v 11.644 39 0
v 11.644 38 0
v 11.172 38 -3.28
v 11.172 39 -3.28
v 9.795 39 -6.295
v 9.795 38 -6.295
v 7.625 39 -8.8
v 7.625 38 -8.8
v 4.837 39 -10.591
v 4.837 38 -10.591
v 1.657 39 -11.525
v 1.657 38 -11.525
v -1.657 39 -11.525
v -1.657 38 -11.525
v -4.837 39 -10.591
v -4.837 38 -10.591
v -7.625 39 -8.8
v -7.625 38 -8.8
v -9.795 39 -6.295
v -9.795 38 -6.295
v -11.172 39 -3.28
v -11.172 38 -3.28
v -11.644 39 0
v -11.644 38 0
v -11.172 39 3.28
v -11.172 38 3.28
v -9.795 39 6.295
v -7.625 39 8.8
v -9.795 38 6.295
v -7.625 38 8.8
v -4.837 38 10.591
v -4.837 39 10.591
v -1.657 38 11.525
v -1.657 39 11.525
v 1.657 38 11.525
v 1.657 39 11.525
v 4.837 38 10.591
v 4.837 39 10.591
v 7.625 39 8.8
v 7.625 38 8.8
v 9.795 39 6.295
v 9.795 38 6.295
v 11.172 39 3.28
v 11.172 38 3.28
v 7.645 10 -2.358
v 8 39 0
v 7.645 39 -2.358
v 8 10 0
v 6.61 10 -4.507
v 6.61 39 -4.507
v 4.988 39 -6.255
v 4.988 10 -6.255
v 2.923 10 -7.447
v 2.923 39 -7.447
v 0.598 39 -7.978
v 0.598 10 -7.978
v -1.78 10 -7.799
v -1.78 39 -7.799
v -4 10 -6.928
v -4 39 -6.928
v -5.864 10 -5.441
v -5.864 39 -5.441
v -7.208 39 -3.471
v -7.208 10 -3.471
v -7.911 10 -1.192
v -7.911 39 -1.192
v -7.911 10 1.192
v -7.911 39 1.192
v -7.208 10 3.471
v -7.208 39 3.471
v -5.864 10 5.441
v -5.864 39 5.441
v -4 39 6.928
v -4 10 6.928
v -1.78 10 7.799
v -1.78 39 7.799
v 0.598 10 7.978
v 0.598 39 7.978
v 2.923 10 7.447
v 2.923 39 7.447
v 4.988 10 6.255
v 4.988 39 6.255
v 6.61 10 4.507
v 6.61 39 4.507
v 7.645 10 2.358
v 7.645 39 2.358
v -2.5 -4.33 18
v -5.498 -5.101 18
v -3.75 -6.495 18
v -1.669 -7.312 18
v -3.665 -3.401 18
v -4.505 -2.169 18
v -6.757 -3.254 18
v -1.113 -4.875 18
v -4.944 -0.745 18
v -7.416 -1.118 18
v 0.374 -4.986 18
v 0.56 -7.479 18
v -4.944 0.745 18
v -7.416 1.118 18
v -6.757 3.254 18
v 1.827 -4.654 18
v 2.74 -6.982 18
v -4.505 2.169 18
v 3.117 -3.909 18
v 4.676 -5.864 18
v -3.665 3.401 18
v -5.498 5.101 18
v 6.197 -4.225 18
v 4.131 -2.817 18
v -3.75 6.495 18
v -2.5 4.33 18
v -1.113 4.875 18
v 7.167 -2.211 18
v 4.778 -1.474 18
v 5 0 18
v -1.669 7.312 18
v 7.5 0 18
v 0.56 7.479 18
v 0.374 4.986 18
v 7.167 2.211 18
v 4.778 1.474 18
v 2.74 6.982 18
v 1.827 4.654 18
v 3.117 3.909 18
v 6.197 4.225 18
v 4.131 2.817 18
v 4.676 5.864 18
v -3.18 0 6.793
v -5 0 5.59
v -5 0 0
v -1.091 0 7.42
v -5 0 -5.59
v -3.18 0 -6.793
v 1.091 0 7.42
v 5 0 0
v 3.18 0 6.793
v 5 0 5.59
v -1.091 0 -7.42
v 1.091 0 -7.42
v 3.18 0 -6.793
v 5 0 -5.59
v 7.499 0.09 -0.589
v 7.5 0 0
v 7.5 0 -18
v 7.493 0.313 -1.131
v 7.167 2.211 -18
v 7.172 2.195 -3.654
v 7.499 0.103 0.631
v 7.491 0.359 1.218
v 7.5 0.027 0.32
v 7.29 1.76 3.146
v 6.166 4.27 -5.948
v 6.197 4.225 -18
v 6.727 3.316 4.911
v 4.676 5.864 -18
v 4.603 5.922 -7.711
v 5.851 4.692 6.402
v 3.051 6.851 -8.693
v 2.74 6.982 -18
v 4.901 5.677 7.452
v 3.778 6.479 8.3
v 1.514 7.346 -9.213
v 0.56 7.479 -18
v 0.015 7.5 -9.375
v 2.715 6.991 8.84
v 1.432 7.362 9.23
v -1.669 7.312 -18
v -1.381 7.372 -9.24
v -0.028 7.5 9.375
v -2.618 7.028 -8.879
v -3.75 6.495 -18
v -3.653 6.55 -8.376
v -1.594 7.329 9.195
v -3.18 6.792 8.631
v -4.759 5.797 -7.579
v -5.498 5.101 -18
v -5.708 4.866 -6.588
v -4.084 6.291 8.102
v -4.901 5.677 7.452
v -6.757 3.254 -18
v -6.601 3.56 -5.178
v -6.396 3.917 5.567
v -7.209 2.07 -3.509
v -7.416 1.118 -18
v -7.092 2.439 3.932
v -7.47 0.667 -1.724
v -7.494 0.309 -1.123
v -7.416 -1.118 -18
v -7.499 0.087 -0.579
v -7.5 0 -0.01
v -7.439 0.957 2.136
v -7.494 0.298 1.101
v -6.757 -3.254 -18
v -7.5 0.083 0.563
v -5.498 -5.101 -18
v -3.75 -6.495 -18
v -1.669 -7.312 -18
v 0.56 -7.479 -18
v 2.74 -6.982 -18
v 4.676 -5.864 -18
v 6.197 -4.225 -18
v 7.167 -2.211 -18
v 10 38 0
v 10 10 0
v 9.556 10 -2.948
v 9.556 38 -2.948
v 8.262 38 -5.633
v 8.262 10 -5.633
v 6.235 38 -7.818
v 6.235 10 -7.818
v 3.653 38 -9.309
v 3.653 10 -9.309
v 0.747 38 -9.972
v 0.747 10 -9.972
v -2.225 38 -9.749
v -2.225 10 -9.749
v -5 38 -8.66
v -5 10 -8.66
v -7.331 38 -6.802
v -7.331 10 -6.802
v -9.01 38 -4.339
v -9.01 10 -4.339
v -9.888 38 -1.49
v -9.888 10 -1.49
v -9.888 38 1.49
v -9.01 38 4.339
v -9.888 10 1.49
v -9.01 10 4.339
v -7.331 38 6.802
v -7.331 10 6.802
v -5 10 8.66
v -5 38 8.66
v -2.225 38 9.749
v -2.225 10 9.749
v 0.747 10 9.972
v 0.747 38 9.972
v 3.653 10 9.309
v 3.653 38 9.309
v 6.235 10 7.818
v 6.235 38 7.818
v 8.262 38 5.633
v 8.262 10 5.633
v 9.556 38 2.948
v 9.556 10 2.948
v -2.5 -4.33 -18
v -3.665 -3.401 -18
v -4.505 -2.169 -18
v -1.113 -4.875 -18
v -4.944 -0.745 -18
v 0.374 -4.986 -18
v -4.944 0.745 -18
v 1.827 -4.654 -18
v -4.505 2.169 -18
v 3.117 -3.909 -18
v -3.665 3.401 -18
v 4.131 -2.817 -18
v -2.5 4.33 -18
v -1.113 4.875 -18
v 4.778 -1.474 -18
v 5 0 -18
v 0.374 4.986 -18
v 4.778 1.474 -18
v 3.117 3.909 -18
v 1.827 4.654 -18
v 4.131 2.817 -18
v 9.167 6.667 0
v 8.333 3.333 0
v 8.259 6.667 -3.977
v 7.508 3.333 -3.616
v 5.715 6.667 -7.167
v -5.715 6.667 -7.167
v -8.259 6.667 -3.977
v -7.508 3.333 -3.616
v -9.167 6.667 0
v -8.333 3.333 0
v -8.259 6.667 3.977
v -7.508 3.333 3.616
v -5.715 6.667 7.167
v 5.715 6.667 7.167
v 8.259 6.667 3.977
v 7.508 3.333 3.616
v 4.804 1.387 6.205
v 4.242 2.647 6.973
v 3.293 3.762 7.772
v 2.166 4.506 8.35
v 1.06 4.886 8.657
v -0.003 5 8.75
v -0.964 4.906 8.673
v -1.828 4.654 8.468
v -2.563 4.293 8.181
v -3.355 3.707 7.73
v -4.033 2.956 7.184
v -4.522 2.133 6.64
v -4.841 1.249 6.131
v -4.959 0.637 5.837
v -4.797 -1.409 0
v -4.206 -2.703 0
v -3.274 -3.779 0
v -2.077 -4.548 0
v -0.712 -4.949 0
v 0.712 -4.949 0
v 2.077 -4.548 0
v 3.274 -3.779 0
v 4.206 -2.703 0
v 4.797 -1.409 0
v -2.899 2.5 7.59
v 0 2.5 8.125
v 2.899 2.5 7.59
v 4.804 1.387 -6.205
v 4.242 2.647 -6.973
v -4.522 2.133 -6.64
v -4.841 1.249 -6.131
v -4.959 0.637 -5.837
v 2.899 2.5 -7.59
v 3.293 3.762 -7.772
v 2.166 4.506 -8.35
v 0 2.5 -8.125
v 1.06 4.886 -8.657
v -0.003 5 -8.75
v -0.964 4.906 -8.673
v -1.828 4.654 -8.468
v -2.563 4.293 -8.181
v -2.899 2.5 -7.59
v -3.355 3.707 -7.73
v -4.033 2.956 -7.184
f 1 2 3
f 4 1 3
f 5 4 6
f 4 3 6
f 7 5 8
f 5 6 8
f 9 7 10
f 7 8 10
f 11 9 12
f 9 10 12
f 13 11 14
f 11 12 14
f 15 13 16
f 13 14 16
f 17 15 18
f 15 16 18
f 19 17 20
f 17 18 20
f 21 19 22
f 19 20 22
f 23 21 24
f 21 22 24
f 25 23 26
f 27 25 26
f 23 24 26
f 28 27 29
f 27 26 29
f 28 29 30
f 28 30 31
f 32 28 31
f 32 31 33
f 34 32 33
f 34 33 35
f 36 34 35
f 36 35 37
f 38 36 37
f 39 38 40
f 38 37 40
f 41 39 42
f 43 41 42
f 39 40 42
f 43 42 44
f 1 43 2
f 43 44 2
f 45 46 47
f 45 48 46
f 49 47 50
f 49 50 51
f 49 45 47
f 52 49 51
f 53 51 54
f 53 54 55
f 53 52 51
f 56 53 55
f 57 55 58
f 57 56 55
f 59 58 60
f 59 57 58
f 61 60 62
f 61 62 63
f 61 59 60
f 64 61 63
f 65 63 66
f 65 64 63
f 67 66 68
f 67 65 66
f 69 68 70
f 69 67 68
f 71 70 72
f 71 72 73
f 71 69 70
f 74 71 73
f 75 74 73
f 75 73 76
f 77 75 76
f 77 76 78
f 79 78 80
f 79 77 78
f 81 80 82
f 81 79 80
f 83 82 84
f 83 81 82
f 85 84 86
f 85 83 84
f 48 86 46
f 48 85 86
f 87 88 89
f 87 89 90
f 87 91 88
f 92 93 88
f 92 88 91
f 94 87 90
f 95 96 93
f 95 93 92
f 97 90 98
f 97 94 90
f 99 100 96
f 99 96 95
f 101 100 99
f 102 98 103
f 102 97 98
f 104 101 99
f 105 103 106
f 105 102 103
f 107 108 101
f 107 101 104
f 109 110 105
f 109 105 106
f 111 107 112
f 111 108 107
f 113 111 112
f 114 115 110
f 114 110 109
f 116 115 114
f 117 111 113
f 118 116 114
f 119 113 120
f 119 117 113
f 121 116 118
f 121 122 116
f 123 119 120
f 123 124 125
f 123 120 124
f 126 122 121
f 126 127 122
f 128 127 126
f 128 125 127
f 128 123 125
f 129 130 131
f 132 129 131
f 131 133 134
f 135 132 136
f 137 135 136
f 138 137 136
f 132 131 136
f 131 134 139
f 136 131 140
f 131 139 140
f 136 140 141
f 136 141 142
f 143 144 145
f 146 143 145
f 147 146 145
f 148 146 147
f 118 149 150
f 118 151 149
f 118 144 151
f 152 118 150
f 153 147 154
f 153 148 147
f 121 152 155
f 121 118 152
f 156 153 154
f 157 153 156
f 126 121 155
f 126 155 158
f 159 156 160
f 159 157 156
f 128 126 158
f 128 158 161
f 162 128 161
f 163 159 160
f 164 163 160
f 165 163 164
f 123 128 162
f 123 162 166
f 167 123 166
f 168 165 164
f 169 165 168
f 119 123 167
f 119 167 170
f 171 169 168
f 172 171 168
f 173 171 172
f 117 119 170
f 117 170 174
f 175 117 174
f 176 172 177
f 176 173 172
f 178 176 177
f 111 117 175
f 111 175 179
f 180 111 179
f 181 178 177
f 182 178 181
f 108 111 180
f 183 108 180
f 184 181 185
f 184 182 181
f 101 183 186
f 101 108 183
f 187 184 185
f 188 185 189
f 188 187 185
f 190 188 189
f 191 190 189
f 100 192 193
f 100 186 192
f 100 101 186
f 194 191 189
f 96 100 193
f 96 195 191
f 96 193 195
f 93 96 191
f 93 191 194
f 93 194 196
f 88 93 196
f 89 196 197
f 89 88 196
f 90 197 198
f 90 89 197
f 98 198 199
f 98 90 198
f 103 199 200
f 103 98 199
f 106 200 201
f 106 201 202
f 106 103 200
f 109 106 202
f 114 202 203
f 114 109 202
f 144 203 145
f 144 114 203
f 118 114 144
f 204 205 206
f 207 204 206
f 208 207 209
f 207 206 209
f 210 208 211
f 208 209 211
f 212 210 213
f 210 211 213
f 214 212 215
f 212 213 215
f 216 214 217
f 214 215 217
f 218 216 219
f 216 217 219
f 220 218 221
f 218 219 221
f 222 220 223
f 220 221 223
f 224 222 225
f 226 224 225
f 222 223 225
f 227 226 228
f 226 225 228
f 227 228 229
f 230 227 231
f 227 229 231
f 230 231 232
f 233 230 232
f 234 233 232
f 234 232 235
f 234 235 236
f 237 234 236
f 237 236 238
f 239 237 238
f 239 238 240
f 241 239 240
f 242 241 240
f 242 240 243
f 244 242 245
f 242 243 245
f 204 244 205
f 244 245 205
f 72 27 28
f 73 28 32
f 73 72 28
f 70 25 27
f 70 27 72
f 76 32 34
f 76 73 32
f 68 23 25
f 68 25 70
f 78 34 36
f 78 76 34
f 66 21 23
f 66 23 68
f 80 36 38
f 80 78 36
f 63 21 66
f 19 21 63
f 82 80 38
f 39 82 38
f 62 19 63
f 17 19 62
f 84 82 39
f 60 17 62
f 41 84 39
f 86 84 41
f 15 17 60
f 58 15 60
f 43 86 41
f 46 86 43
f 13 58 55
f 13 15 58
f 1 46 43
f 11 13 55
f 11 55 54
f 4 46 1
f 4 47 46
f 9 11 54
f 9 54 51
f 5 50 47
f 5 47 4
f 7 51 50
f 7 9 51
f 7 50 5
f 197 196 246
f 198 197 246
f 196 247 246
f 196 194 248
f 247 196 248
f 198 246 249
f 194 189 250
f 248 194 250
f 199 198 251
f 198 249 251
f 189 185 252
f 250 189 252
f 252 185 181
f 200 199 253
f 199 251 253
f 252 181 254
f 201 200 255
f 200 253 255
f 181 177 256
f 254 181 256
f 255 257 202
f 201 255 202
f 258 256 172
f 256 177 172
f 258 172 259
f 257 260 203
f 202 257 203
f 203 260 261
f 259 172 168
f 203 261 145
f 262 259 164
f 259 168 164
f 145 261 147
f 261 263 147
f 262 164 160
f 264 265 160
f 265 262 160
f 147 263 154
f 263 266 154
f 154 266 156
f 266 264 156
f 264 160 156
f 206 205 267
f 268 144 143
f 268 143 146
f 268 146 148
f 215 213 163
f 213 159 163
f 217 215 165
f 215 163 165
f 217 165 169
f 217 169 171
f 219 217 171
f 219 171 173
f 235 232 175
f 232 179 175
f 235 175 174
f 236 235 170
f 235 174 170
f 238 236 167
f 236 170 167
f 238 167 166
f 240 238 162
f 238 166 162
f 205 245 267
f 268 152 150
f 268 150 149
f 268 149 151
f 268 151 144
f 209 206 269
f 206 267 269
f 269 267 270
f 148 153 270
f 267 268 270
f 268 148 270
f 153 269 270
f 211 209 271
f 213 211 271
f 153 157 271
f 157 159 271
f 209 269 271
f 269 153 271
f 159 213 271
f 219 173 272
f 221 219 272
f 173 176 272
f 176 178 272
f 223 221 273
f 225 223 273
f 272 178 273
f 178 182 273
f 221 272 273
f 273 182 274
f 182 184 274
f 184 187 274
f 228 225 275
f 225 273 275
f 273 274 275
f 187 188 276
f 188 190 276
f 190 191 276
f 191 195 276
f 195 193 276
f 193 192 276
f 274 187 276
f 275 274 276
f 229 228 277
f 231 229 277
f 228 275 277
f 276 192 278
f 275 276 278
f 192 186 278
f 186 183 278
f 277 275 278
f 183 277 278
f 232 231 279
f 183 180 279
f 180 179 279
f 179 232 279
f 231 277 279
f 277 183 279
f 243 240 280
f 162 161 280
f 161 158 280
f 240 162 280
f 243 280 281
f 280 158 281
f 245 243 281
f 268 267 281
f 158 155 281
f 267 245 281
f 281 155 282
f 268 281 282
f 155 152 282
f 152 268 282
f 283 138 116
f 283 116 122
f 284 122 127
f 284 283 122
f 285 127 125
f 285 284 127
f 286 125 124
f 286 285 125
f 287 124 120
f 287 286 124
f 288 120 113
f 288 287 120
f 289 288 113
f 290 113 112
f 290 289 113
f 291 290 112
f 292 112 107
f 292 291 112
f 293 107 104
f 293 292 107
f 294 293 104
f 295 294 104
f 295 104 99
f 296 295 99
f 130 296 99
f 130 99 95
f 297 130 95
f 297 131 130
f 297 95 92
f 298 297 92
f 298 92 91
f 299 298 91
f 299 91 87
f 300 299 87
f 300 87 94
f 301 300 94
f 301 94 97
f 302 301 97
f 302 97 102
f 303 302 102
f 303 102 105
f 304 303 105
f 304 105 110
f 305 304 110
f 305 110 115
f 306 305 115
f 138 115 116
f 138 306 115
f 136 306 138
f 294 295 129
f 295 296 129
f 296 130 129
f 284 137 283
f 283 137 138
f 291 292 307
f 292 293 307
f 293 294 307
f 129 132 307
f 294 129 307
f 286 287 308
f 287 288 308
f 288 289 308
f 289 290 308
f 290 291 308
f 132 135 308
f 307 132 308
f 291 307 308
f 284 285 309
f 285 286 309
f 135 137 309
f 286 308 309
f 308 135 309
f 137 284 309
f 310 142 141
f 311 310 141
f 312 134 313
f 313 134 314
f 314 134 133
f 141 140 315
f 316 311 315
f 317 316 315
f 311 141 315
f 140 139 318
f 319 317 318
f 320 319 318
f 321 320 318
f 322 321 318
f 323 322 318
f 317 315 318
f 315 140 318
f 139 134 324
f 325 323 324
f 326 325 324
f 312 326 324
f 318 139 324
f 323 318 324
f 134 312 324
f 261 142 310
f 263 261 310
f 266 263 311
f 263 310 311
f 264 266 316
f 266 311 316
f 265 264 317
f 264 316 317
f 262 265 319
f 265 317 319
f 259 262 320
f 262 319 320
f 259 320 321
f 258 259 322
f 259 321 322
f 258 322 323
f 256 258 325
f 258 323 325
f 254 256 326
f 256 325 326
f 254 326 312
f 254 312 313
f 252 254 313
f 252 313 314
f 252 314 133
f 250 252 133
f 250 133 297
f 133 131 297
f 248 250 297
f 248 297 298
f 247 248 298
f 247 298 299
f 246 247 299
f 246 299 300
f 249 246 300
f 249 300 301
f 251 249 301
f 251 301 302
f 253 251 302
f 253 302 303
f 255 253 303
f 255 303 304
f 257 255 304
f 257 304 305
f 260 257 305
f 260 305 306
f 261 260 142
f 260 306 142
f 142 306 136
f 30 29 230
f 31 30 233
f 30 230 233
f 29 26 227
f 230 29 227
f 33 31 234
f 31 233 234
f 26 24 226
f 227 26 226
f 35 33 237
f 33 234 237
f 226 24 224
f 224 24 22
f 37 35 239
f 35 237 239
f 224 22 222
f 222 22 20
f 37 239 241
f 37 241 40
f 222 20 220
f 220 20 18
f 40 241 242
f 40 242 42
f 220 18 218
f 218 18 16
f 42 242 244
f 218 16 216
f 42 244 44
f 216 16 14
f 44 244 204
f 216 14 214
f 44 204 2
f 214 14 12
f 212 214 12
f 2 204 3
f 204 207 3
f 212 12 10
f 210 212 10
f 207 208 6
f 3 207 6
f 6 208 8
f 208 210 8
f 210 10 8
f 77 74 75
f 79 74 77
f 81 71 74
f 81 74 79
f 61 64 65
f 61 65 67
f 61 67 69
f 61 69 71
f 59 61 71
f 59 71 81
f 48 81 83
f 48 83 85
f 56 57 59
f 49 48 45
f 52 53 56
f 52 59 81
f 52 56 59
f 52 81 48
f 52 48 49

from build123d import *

# Parameters (mm, degrees)
SKETCH1_R                = 7.5
SKETCH1_R_2              = 5
BOSS_EXTRUDE1_DEPTH      = 18
BOSS_EXTRUDE1_DEPTH_BACK = 18
SKETCH3_R                = 10
SKETCH2_R                = 7.5
SKETCH4_R                = 10
SKETCH4_R_2              = 8
BOSS_EXTRUDE3_DEPTH      = 28
SKETCH5_R                = 11.643608711
SKETCH5_R_2              = 8
BOSS_EXTRUDE4_DEPTH      = 1


with BuildPart() as part:
    # Sketch1 → Boss-Extrude1 (new body, two sides)
    with BuildSketch(Plane.XY) as boss_extrude1_sk:
        Circle(SKETCH1_R)
        Circle(SKETCH1_R_2, mode=Mode.SUBTRACT)
    extrude(amount=BOSS_EXTRUDE1_DEPTH)
    extrude(boss_extrude1_sk.sketch, amount=-BOSS_EXTRUDE1_DEPTH_BACK)

    # Sketch3 → Loft1 section 0
    with BuildSketch(Plane(origin=(0, 10, 0), x_dir=(1, 0, 0), z_dir=(0, 1, 0))):
        Circle(SKETCH3_R)
    # Sketch2 → Loft1 section 1
    with BuildSketch(Plane(origin=(0, 0, 0), x_dir=(1, 0, 0), z_dir=(0, 1, 0))):
        Circle(SKETCH2_R)
    loft()

    # Sketch4 → Boss-Extrude3 (add)
    with BuildSketch(Plane(origin=(0, 10, 0), x_dir=(1, 0, 0), z_dir=(0, 1, 0))):
        Circle(SKETCH4_R)
        Circle(SKETCH4_R_2, mode=Mode.SUBTRACT)
    extrude(amount=BOSS_EXTRUDE3_DEPTH)

    # Sketch5 → Boss-Extrude4 (add)
    with BuildSketch(Plane(origin=(0, 38, 0), x_dir=(1, 0, 0), z_dir=(0, 1, 0))):
        Circle(SKETCH5_R)
        Circle(SKETCH5_R_2, mode=Mode.SUBTRACT)
    extrude(amount=BOSS_EXTRUDE4_DEPTH)


solid = part.part
